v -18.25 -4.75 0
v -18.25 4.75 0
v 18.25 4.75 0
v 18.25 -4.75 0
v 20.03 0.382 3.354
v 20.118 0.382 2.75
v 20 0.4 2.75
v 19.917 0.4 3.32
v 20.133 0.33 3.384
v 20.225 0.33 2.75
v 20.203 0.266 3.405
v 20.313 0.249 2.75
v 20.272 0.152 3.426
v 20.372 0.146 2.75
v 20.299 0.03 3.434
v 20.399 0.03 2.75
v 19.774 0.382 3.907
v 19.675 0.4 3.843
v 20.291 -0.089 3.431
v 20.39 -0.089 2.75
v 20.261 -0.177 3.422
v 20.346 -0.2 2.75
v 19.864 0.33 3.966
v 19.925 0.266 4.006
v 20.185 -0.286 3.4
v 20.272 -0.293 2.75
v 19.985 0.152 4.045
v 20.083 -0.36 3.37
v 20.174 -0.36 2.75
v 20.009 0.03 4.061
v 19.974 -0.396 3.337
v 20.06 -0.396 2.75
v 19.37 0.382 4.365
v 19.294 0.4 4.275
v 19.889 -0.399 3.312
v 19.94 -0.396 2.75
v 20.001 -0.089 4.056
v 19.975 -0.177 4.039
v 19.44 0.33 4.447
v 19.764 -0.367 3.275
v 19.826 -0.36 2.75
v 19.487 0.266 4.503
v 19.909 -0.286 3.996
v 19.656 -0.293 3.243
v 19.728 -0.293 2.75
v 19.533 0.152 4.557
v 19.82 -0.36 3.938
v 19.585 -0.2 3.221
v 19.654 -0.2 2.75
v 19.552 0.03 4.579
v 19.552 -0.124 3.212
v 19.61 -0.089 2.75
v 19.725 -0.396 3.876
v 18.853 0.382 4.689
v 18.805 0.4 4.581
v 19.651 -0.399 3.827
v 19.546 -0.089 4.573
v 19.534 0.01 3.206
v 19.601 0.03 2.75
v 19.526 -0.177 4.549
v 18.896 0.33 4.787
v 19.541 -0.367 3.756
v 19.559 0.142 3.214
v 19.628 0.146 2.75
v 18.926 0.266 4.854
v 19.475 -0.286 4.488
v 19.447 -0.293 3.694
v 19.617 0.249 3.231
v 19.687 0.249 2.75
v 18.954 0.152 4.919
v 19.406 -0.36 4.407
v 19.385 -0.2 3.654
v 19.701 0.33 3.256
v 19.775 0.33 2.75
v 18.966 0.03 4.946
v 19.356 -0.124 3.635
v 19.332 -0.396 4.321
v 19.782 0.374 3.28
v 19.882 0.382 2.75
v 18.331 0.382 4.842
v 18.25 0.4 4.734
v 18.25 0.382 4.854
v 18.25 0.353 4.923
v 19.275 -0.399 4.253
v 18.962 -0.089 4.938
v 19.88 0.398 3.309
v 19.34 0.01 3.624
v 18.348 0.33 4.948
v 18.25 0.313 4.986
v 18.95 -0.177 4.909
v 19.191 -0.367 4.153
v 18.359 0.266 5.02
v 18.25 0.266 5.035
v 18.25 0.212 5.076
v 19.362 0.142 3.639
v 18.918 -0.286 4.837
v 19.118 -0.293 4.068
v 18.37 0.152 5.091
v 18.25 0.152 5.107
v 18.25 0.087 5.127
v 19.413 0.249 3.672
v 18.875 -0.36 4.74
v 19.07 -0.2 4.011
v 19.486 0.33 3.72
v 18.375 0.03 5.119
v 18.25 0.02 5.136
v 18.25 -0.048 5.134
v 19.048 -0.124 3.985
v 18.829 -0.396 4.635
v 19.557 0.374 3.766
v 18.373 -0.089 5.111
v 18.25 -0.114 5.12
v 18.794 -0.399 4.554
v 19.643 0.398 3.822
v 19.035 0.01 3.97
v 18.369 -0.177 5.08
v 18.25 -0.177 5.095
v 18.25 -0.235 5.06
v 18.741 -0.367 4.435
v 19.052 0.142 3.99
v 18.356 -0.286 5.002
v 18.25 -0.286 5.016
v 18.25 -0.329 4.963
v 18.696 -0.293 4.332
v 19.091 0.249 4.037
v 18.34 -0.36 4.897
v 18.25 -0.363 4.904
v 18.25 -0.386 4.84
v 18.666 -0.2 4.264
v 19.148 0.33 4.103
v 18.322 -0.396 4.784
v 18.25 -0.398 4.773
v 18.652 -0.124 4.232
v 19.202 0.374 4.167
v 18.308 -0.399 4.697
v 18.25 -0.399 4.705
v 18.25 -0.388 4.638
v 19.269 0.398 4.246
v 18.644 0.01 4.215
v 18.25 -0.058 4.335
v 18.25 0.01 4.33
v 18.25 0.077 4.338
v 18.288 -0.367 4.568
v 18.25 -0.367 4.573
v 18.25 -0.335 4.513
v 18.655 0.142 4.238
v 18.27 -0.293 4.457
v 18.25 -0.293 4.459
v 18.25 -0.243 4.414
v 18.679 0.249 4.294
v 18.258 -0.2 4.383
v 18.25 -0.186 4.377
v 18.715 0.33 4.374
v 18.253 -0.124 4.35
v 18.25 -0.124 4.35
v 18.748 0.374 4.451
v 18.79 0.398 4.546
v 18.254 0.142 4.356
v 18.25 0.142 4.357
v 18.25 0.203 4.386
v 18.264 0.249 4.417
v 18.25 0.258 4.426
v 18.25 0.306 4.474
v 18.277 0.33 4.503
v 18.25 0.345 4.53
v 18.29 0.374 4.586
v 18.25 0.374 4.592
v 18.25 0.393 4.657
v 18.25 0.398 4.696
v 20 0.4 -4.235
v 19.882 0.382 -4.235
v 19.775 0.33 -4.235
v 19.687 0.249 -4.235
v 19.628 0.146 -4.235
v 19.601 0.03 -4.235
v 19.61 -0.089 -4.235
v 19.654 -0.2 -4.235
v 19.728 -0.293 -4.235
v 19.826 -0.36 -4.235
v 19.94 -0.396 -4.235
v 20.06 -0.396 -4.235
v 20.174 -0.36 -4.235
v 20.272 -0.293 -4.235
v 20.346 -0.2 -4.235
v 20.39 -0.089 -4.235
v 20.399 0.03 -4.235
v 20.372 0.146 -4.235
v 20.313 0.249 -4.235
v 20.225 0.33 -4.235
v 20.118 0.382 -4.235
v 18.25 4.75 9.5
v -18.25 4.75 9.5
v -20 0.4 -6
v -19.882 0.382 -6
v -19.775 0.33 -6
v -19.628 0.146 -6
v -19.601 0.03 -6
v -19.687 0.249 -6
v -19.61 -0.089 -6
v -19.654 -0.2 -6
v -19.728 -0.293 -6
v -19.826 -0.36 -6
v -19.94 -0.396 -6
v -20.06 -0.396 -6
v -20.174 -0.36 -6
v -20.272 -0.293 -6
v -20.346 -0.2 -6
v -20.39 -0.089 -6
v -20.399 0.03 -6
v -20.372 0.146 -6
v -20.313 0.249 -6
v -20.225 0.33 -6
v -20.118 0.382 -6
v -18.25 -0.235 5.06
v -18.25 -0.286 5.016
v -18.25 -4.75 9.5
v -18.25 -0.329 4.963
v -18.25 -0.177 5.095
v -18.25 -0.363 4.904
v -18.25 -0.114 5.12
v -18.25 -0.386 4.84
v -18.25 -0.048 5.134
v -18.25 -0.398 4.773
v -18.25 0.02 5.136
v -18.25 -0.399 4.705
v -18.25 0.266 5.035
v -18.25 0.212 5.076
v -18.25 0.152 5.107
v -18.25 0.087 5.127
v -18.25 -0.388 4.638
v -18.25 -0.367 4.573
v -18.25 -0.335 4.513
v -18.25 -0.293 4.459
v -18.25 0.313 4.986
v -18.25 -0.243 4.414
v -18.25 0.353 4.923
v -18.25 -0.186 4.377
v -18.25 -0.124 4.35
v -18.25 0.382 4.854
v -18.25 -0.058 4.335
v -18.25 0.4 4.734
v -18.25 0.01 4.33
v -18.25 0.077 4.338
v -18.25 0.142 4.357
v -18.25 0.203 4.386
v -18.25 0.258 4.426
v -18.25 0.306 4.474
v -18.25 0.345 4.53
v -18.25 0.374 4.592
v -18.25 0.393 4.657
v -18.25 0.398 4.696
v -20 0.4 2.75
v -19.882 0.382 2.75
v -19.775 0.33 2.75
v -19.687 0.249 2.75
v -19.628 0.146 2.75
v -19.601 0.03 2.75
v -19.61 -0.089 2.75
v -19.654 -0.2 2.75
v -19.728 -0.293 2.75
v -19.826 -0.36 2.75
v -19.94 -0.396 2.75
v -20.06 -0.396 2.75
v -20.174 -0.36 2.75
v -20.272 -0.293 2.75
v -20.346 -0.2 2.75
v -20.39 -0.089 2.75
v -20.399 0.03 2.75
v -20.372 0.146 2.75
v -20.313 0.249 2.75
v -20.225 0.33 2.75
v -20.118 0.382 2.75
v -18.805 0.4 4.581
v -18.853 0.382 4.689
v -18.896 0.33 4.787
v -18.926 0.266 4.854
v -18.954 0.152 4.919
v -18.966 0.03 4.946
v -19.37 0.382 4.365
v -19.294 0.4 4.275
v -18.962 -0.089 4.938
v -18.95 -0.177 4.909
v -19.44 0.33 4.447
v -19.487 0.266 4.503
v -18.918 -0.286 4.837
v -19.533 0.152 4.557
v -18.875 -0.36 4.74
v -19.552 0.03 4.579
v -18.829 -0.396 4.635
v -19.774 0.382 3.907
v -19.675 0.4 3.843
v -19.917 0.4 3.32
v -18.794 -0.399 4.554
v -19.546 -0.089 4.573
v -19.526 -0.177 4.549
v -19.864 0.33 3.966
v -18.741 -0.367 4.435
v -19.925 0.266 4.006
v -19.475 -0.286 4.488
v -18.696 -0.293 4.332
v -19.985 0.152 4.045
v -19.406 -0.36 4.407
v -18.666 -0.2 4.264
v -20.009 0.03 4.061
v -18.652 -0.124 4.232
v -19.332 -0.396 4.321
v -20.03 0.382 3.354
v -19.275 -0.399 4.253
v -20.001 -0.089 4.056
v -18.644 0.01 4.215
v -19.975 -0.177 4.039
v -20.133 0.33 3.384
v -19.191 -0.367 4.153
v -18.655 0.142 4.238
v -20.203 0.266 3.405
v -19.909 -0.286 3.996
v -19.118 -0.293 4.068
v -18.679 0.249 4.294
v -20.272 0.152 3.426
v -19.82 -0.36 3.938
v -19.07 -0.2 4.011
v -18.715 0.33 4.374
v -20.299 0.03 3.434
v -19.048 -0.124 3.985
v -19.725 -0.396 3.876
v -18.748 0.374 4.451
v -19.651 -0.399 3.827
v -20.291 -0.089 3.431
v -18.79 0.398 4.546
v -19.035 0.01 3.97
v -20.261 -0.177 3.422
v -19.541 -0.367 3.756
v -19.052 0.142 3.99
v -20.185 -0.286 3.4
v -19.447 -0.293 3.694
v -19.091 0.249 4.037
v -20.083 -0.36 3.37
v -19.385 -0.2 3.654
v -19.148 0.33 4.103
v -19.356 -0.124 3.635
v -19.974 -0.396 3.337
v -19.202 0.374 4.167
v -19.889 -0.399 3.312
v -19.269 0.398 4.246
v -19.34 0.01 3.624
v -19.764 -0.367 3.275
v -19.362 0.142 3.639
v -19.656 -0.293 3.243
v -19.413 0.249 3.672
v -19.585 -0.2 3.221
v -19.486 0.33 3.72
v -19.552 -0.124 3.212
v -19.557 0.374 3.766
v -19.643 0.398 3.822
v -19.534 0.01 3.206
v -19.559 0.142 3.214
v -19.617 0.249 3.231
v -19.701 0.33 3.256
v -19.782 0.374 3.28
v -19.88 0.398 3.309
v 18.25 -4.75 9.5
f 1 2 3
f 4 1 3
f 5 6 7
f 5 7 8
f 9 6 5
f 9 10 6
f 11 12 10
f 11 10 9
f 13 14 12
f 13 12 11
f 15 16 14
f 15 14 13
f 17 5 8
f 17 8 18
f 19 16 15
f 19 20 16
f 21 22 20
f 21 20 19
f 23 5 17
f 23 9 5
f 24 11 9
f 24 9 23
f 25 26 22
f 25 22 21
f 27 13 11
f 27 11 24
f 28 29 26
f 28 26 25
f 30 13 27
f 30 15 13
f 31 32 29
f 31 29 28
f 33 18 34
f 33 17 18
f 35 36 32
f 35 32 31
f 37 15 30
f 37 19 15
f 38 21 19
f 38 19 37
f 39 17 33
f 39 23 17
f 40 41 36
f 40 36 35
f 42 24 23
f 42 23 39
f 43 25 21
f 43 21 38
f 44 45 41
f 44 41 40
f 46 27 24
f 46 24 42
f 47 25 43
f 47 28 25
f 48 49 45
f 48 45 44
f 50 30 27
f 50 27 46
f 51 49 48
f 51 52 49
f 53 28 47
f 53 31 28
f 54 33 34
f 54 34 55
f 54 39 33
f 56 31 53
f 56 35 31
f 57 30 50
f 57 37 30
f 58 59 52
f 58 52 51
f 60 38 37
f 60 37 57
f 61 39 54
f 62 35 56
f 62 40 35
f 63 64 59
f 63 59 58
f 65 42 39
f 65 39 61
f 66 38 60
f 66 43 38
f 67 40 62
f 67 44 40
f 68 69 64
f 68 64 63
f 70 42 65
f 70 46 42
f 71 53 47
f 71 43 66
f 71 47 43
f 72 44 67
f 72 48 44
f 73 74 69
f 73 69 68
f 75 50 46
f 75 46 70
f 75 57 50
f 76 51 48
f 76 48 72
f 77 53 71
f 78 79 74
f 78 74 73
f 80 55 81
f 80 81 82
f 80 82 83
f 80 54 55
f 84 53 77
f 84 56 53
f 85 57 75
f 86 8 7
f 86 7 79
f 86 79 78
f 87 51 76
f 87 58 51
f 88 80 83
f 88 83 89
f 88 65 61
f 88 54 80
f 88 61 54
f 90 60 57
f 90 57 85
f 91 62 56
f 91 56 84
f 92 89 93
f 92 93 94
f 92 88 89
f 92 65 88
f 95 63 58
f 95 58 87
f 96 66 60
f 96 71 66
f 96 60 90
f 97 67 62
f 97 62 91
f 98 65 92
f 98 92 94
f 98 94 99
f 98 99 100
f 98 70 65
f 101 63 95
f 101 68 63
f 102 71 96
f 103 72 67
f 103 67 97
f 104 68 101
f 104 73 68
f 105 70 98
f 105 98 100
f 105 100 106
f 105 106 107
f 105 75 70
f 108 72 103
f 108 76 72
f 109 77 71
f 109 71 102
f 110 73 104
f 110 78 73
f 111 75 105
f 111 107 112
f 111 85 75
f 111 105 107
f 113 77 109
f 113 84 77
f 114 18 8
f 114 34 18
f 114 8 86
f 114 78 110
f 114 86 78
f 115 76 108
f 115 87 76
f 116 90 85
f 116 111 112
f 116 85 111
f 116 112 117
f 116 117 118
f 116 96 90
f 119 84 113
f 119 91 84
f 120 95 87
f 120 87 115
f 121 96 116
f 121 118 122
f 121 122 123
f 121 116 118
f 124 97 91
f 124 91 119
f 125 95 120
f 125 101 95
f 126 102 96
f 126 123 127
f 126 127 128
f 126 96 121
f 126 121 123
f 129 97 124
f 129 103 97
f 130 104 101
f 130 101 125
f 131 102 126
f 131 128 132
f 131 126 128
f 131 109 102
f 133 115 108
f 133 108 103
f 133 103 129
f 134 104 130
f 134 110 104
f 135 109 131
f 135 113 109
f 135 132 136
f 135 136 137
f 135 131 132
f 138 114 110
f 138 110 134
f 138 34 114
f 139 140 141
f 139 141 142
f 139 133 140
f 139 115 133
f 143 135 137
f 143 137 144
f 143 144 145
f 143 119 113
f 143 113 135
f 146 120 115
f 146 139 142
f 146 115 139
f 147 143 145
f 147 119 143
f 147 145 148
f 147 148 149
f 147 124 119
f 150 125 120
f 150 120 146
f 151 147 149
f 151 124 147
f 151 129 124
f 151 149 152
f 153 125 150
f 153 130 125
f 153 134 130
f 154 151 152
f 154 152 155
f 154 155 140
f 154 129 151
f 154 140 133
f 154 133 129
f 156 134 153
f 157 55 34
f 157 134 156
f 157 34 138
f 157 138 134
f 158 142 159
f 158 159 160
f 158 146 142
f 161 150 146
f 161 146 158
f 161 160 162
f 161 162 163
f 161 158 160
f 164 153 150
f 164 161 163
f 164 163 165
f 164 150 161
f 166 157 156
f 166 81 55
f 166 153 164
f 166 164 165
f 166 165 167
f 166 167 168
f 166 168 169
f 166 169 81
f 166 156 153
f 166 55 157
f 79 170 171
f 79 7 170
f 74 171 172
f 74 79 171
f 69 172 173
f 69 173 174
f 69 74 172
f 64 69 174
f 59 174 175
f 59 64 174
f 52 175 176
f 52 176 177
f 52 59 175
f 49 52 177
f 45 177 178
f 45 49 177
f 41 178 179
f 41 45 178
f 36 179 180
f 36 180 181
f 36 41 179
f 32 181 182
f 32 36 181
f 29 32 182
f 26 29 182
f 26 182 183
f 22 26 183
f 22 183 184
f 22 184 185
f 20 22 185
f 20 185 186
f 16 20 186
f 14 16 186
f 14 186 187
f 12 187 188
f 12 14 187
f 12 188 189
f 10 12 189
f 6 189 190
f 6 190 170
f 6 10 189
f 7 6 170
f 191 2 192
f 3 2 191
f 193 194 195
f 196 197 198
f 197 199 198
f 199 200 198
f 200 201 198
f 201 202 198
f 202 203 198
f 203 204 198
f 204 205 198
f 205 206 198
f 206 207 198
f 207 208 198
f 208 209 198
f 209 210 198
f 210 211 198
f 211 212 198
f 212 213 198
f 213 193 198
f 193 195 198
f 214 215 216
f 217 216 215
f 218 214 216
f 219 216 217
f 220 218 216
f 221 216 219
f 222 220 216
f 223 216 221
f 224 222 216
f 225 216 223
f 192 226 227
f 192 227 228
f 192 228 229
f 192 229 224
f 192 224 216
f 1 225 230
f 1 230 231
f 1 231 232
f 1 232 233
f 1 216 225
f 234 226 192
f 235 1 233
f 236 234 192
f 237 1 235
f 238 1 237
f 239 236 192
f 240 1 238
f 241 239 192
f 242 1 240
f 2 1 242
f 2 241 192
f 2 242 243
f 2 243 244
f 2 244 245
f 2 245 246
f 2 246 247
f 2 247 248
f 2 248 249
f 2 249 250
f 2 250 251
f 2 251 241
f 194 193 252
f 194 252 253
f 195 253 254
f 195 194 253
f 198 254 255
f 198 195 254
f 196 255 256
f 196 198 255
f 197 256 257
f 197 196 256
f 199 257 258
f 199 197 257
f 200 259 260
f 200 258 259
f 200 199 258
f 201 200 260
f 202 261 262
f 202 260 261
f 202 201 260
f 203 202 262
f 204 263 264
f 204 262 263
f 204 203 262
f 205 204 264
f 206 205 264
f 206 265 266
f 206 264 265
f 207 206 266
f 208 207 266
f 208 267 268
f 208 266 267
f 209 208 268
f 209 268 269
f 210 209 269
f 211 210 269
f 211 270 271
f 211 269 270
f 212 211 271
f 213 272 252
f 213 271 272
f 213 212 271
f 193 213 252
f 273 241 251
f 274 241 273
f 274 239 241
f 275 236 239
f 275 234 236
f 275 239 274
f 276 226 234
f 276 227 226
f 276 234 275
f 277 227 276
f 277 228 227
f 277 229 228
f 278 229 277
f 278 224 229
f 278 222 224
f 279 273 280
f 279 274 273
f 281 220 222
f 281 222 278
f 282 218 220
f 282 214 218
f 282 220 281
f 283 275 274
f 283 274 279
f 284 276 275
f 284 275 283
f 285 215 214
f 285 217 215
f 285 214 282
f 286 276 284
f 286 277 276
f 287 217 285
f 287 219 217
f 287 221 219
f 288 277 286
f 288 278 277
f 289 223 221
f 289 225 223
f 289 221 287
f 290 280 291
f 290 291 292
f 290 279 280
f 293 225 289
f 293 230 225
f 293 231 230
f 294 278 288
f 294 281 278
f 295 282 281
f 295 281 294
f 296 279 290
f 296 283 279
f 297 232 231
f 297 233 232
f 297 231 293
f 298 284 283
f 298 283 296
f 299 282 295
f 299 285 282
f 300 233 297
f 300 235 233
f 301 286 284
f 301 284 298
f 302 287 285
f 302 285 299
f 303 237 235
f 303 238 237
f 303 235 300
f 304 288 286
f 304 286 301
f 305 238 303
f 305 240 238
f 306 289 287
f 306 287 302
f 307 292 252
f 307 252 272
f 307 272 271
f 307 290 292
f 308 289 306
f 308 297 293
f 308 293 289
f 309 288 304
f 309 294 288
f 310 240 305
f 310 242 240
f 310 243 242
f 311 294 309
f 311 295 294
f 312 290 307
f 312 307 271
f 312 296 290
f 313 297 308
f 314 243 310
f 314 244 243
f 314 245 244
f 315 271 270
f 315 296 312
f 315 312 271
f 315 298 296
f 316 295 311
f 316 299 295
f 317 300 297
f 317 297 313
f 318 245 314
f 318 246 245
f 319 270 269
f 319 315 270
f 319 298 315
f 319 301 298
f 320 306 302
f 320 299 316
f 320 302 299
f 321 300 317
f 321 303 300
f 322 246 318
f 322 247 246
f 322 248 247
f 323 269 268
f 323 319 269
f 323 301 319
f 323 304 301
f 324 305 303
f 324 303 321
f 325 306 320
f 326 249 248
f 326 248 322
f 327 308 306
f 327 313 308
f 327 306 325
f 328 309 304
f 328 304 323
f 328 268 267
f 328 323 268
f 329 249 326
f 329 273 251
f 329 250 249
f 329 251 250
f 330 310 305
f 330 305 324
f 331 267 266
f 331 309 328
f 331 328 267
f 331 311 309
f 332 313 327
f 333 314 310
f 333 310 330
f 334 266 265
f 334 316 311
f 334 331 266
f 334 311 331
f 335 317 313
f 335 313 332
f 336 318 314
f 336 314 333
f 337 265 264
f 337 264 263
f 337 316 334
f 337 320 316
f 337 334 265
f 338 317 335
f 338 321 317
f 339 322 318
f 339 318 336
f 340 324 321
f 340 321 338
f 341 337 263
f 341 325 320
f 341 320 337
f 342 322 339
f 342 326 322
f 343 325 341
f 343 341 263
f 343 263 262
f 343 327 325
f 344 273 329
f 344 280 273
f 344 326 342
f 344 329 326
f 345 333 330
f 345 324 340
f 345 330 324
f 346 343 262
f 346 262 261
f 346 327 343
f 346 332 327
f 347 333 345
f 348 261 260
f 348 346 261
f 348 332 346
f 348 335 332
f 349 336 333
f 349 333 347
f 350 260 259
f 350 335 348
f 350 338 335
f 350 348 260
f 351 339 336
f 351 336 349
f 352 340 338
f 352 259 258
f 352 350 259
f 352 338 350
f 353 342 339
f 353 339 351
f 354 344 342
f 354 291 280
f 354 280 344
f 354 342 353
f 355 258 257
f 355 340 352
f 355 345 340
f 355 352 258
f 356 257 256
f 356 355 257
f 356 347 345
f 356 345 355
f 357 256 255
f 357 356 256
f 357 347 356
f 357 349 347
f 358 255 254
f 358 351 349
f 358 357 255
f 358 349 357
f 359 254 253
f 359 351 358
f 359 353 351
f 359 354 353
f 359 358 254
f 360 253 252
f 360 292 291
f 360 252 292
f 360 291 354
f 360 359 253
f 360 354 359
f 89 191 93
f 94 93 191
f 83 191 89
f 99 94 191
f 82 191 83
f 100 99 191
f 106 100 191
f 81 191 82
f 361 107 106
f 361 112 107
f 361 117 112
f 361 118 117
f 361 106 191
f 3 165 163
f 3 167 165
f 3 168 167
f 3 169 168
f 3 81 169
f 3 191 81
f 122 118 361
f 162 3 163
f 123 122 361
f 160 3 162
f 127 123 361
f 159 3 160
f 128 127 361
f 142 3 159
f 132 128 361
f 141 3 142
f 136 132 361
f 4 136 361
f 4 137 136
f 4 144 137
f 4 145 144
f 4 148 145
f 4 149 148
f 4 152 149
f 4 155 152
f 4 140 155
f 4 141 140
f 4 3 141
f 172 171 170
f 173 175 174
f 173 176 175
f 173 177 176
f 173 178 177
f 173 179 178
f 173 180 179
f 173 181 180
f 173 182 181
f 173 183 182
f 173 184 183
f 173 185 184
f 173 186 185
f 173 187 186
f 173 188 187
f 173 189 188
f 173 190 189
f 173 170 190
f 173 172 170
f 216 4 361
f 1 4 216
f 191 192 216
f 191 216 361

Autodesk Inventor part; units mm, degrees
ref_plane "YZ Plane" through (0, 0, 0) normal (1, 0, 0) x (0, 1, 0)
ref_plane "XZ Plane" through (0, 0, 0) normal (0, 1, 0) x (-1, 0, 0)
ref_plane "XY Plane" through (0, 0, 0) normal (0, 0, 1) x (1, 0, 0)
sketch "Boceto39" plane through (0, 0, 0) normal (0, 0, 1) x (1, 0, 0)
  line L0 (-18.25, 4.75) -> (18.25, 4.75)
  line L1 (18.25, 4.75) -> (18.25, -4.75)
  line L2 (18.25, -4.75) -> (-18.25, -4.75)
  line L3 (-18.25, -4.75) -> (-18.25, 4.75)
  point P0 (0, 0)
  point P1 (0, 4.75)
  point P2 (-18.25, 0)
  dimension "d373" = 36.5
  dimension "d374" = 9.5
extrude "Extrusión13" add sketch "Boceto39" along normal blind 9.5
sketch "Boceto40" plane through (0, 0, 0) normal (0, 1, 0) x (-1, 0, 0)
  line L0 (18.25, 0) -> (-18.25, 0) projected
  line L1 (18.25, 0) -> (18.25, 9.5) projected
  line L2 (-18.25, 9.5) -> (18.25, 9.5) projected
  line L3 (-18.25, 0) -> (-18.25, 9.5) projected
  line L4 (-20, -4.2347) -> (-20, 2.75)
  line L5 (-18, 4.75) -> (18, 4.75)
  line L6 (20, 2.75) -> (20, -6)
  arc A0 (20, 2.75) -> (18, 4.75) centre (18, 2.75) ccw
  arc A1 (-18, 4.75) -> (-20, 2.75) centre (-18, 2.75) ccw
  point P0 (0, 0)
  point P1 (0, 4.75)
  point P2 (18.25, 4.75)
  point P3 (0, 0)
  dimension "d377" = 20
  dimension "d378" = 2
  dimension "d379" = 6
sketch "Boceto41" plane through (0, 0, 0) normal (1, 0, 0) x (0, 1, 0)
  circle A0 centre (0, 4.75) radius 0.4
  point P0 (0, 0)
  dimension "d380" = 0.8
sweep "Barrido1" add profiles "Boceto41" path "Boceto40" path curves L6 A0 L5 A1 L4
properties part number "AXIAL-POWER-10W"
